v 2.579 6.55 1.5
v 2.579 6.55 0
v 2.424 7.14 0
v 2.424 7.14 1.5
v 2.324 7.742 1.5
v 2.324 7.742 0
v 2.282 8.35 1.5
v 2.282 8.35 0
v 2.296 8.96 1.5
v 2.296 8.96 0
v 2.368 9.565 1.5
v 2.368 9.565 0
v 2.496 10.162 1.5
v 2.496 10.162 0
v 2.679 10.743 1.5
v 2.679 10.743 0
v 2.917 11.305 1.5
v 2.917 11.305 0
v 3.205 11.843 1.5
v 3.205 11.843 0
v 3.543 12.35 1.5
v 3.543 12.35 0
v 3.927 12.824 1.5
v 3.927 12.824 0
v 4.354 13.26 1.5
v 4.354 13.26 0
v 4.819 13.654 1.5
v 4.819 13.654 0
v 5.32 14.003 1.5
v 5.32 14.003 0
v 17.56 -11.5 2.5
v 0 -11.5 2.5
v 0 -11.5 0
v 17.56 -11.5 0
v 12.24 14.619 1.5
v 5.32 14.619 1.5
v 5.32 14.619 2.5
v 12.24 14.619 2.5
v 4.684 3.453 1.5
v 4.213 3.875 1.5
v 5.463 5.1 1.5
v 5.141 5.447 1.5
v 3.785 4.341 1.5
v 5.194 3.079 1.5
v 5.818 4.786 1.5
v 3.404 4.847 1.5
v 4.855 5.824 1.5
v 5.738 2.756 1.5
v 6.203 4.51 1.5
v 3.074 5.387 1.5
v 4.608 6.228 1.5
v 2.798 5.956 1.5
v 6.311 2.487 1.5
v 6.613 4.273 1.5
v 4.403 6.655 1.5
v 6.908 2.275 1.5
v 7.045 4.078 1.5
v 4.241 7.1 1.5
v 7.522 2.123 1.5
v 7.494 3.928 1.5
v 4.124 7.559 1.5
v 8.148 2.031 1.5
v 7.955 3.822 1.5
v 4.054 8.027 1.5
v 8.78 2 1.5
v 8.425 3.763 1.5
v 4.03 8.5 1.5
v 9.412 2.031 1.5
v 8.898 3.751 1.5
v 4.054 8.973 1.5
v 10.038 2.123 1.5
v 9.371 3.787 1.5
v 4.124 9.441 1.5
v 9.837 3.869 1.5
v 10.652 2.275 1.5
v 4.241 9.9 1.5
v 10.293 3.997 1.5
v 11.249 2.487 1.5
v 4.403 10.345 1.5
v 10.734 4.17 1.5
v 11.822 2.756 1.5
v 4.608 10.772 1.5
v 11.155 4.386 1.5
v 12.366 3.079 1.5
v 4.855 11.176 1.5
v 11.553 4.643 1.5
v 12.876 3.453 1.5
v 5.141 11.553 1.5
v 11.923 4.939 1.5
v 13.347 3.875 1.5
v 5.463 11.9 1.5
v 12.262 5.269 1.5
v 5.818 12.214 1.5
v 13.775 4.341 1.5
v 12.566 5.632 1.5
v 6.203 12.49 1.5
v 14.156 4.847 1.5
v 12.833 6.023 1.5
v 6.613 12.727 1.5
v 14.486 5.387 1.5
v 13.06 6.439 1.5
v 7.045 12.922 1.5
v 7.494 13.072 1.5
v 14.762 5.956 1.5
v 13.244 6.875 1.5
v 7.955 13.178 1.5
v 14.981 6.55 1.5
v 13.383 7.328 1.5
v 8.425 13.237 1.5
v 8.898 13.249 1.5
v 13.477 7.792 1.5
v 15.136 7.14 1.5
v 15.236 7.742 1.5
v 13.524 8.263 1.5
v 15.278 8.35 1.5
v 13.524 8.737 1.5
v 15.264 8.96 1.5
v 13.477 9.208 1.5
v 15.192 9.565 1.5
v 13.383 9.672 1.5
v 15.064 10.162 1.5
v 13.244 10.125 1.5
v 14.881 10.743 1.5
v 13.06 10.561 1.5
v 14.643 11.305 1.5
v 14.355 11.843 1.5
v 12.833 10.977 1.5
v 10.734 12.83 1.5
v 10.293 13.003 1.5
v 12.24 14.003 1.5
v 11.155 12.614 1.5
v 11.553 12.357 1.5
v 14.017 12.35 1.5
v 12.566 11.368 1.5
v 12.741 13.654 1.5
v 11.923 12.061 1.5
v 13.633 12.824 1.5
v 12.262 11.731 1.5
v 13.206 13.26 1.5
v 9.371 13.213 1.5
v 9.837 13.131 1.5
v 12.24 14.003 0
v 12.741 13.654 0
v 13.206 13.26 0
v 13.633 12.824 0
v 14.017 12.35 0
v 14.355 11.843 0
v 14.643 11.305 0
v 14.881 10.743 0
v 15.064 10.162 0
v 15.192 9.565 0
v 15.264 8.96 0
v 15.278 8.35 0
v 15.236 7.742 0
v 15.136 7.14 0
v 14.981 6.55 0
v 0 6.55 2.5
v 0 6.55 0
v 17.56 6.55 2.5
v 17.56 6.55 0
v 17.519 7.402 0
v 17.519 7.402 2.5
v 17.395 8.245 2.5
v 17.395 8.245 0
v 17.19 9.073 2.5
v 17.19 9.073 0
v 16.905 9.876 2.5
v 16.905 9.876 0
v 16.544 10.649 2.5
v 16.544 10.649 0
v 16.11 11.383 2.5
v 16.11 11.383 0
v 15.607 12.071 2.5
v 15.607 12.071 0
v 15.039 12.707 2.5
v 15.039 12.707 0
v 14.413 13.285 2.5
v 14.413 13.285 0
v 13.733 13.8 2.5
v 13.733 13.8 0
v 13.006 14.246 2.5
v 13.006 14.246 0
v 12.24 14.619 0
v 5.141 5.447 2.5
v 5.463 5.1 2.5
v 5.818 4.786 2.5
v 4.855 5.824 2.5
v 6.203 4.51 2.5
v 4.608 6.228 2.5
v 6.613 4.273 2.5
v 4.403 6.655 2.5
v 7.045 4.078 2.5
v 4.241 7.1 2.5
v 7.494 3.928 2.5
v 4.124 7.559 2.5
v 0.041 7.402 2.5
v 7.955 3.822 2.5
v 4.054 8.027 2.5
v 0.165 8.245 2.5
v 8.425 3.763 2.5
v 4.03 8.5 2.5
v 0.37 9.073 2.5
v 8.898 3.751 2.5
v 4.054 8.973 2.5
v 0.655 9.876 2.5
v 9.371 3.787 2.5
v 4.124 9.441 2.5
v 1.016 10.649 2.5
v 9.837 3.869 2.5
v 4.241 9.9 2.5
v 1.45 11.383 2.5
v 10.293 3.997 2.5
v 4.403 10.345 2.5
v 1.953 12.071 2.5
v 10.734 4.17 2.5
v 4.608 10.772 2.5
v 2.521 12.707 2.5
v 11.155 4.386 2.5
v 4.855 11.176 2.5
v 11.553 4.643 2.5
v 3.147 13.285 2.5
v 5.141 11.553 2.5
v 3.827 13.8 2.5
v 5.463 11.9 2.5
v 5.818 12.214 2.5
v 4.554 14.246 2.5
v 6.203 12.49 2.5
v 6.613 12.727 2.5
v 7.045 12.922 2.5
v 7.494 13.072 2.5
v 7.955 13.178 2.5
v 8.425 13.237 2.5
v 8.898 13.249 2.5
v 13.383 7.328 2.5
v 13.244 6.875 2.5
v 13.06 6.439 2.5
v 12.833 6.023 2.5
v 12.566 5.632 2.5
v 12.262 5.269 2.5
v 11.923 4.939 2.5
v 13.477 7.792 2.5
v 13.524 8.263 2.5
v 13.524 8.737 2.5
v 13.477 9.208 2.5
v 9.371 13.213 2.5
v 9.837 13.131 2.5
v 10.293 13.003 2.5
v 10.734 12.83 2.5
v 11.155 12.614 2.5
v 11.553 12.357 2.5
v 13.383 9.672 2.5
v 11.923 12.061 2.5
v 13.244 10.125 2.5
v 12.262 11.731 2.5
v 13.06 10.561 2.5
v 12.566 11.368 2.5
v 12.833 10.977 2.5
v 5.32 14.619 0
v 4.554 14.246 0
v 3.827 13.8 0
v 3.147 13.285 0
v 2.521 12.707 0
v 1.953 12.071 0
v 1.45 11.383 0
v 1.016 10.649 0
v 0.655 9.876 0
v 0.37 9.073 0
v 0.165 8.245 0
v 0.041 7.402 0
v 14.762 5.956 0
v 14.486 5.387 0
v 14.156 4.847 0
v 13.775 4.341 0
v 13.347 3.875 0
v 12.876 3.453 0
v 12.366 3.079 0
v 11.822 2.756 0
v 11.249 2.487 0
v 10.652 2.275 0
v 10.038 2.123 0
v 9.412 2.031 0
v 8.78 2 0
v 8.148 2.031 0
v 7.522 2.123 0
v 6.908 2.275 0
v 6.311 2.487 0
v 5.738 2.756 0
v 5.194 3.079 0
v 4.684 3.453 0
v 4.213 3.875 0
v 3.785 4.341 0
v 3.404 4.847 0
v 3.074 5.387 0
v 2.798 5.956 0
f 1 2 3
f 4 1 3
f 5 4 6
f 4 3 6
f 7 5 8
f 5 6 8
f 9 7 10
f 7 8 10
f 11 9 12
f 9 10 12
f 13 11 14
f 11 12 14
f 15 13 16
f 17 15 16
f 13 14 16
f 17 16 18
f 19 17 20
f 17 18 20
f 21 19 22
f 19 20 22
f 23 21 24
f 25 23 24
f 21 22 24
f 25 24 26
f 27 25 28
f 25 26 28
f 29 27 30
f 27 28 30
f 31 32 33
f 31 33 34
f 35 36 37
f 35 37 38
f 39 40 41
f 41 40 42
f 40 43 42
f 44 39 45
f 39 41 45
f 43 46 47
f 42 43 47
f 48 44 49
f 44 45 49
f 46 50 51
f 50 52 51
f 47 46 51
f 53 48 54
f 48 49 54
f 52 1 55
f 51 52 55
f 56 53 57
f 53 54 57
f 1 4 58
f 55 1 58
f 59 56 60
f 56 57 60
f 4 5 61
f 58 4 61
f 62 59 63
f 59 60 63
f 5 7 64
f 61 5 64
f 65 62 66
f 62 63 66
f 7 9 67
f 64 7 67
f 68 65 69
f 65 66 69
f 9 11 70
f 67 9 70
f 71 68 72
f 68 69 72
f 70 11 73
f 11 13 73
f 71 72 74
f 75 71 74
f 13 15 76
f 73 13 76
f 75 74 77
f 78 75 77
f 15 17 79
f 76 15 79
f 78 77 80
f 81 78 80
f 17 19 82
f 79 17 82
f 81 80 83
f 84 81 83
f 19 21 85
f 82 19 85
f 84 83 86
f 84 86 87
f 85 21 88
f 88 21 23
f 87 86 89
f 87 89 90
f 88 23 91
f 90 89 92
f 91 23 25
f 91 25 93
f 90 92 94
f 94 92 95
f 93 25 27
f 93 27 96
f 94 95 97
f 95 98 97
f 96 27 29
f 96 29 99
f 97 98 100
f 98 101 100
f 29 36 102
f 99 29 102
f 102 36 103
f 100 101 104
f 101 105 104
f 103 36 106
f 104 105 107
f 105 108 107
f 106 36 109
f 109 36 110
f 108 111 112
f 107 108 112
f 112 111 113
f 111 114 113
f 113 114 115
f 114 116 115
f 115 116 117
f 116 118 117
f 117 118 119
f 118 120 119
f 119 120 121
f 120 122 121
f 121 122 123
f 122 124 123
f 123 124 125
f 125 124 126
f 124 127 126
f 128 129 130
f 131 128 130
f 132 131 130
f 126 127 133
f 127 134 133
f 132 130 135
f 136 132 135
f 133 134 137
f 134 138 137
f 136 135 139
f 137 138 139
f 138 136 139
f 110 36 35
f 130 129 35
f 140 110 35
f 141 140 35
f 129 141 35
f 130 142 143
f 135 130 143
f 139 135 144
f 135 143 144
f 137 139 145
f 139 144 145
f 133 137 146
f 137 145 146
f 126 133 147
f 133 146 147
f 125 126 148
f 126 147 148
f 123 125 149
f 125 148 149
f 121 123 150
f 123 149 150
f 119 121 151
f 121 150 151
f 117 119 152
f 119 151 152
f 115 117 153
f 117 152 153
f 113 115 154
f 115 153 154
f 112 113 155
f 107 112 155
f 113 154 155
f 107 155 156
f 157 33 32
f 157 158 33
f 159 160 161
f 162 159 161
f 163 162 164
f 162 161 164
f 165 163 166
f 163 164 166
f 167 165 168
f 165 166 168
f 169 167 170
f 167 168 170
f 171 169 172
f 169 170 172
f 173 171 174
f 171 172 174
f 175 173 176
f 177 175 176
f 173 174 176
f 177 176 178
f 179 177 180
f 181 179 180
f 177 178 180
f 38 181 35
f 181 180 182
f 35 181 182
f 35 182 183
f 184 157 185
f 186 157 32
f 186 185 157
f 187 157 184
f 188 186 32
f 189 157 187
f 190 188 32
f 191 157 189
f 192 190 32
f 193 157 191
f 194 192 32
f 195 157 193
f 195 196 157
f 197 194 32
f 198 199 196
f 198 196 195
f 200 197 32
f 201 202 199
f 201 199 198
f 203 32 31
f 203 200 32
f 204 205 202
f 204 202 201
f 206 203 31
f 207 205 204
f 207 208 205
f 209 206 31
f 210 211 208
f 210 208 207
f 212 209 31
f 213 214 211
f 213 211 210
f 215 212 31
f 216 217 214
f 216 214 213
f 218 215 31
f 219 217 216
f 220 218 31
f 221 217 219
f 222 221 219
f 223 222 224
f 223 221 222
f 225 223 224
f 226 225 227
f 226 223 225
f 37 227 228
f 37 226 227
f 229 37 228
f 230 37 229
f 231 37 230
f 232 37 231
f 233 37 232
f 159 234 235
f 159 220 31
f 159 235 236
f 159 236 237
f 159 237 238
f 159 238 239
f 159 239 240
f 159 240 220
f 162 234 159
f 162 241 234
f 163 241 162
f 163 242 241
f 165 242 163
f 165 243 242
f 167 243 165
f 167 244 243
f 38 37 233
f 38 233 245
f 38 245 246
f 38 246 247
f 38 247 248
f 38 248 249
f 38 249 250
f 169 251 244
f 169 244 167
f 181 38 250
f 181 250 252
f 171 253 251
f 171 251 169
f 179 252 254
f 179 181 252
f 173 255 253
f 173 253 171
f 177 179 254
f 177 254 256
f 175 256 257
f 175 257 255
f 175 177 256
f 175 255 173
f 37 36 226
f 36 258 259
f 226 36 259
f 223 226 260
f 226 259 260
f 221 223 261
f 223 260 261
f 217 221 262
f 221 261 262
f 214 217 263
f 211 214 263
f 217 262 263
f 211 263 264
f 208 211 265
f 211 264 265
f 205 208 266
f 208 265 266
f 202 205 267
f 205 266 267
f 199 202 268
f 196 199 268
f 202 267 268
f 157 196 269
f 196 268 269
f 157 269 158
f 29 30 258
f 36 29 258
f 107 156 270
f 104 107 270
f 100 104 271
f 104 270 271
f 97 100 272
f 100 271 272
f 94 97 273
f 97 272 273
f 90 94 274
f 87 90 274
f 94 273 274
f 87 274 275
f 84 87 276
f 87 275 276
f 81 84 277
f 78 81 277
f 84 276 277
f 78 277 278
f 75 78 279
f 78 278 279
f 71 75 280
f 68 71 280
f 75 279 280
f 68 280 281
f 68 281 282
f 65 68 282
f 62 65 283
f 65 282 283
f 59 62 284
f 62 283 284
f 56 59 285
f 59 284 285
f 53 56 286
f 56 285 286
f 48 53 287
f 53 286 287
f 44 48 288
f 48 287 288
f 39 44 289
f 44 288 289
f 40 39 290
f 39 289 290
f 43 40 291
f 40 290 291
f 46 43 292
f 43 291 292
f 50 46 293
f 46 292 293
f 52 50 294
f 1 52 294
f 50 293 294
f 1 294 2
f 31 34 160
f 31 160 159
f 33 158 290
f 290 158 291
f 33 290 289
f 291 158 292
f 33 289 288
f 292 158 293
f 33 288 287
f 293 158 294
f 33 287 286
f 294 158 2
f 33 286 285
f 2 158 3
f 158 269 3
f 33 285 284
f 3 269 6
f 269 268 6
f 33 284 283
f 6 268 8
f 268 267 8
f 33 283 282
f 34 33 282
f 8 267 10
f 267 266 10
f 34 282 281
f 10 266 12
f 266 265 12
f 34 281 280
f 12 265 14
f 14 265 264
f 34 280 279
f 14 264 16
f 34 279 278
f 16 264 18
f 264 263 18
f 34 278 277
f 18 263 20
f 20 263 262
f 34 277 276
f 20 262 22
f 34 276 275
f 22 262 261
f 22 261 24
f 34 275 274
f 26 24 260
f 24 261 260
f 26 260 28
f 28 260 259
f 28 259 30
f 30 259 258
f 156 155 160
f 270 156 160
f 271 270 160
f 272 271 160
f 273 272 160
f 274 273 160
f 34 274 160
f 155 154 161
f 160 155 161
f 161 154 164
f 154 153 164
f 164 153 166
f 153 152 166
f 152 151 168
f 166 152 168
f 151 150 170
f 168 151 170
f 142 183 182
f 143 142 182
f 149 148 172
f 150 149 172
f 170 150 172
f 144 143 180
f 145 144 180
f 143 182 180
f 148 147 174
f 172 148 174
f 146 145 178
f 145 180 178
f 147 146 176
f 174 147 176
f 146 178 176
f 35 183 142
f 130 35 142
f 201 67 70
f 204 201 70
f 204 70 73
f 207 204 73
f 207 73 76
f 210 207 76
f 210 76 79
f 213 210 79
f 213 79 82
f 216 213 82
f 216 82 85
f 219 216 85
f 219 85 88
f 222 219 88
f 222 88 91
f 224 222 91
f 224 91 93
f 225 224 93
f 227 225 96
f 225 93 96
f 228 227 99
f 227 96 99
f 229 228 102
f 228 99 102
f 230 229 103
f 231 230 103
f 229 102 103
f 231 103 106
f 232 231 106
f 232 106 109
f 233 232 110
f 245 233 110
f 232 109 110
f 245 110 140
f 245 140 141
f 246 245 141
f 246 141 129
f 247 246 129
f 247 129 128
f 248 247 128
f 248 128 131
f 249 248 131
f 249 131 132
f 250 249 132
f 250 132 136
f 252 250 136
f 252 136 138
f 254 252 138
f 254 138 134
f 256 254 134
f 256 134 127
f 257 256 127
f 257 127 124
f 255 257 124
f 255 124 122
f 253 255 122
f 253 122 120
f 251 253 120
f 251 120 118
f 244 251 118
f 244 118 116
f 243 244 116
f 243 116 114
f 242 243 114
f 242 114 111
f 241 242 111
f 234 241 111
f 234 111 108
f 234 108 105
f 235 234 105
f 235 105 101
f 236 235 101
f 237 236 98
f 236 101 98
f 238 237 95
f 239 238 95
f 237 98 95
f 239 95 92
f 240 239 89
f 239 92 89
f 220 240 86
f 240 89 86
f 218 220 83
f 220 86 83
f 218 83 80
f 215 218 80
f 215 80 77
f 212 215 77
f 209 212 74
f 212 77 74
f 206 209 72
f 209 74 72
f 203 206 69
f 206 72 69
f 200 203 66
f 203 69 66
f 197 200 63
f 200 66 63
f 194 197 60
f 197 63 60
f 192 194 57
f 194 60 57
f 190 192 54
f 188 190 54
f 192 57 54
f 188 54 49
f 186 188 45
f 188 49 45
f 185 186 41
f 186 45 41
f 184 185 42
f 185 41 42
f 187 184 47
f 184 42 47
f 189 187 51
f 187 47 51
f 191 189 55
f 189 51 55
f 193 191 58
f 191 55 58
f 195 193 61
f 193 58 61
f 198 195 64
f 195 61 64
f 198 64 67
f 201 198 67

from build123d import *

# Parameters (mm, degrees)
BOSS_EXTRUDE1_DEPTH = 1.5
BOSS_EXTRUDE2_DEPTH = 1
SKETCH4_R           = 4.75
CUT_EXTRUDE1_DEPTH  = 23.898325822
SKETCH5_W           = 17.56
SKETCH5_H           = 2.5
BOSS_EXTRUDE3_DEPTH = 0.15
SKETCH6_W           = 17.56
SKETCH6_H           = 2.5
BOSS_EXTRUDE4_DEPTH = 11.35


with BuildPart() as part:
    # Sketch1 → Boss-Extrude1 (new body)
    with BuildSketch(Plane.XY):
        with BuildLine():
            ThreePointArc((14.980604809, 6.55), (8.78, 2), (2.579395191, 6.55))
            Line((2.579395191, 6.55), (0, 6.55))
            Line((0, 6.55), (0, 0))
            Line((0, 0), (17.56, 0))
            Line((17.56, 0), (17.56, 6.55))
            Line((17.56, 6.55), (14.980604809, 6.55))
        make_face()
        with BuildLine():
            ThreePointArc((2.579395191, 6.55), (2.679421093, 10.743420825), (5.32, 14.002581212))
            Line((5.32, 14.002581212), (5.32, 14.619498126))
            ThreePointArc((5.32, 14.619498126), (1.449679407, 11.382680416), (0, 6.55))
            Line((0, 6.55), (2.579395191, 6.55))
        make_face()
        with BuildLine():
            ThreePointArc((12.24, 14.002581212), (14.880578907, 10.743420825), (14.980604809, 6.55))
            Line((14.980604809, 6.55), (17.56, 6.55))
            ThreePointArc((17.56, 6.55), (16.110320593, 11.382680416), (12.24, 14.619498126))
            Line((12.24, 14.619498126), (12.24, 14.002581212))
        make_face()
    extrude(amount=BOSS_EXTRUDE1_DEPTH)

    # Sketch3 → Boss-Extrude2 (add)
    with BuildSketch(Plane.XY.offset(1.5)):
        with BuildLine():
            Line((12.24, 14.619498126), (12.24, 14.002581212))
            ThreePointArc((12.24, 14.002581212), (8.78, 2), (5.32, 14.002581212))
            Line((5.32, 14.002581212), (5.32, 14.619498126))
            ThreePointArc((5.32, 14.619498126), (1.449679407, 11.382680416), (0, 6.55))
            Line((0, 6.55), (0, 0))
            Line((0, 0), (17.56, 0))
            Line((17.56, 0), (17.56, 6.55))
            ThreePointArc((17.56, 6.55), (16.110320593, 11.382680416), (12.24, 14.619498126))
        make_face()
        with BuildLine():
            Line((5.32, 14.619498126), (12.24, 14.619498126))
            Line((12.24, 14.619498126), (12.24, 14.002581212))
            ThreePointArc((12.24, 14.002581212), (8.78, 2), (5.32, 14.002581212))
            Line((5.32, 14.002581212), (5.32, 14.619498126))
        make_face()
    extrude(amount=BOSS_EXTRUDE2_DEPTH)

    # Sketch4 → Cut-Extrude1 (cut, through all)
    with BuildSketch(Plane(origin=(0, 0, 1.5), x_dir=(-1, 0, 0), z_dir=(0, 0, -1))):
        with Locations((-8.78, 8.5)):
            Circle(SKETCH4_R)
    extrude(amount=-CUT_EXTRUDE1_DEPTH, mode=Mode.SUBTRACT)

    # Sketch5 → Boss-Extrude3 (add)
    with BuildSketch(Plane.XZ):
        with Locations((8.78, 1.25)):
            Rectangle(SKETCH5_W, SKETCH5_H)
    extrude(amount=BOSS_EXTRUDE3_DEPTH)

    # Sketch6 → Boss-Extrude4 (add)
    with BuildSketch(Plane.XZ.offset(0.15)):
        with Locations((8.78, 1.25)):
            Rectangle(SKETCH6_W, SKETCH6_H)
    extrude(amount=BOSS_EXTRUDE4_DEPTH)


solid = part.part
